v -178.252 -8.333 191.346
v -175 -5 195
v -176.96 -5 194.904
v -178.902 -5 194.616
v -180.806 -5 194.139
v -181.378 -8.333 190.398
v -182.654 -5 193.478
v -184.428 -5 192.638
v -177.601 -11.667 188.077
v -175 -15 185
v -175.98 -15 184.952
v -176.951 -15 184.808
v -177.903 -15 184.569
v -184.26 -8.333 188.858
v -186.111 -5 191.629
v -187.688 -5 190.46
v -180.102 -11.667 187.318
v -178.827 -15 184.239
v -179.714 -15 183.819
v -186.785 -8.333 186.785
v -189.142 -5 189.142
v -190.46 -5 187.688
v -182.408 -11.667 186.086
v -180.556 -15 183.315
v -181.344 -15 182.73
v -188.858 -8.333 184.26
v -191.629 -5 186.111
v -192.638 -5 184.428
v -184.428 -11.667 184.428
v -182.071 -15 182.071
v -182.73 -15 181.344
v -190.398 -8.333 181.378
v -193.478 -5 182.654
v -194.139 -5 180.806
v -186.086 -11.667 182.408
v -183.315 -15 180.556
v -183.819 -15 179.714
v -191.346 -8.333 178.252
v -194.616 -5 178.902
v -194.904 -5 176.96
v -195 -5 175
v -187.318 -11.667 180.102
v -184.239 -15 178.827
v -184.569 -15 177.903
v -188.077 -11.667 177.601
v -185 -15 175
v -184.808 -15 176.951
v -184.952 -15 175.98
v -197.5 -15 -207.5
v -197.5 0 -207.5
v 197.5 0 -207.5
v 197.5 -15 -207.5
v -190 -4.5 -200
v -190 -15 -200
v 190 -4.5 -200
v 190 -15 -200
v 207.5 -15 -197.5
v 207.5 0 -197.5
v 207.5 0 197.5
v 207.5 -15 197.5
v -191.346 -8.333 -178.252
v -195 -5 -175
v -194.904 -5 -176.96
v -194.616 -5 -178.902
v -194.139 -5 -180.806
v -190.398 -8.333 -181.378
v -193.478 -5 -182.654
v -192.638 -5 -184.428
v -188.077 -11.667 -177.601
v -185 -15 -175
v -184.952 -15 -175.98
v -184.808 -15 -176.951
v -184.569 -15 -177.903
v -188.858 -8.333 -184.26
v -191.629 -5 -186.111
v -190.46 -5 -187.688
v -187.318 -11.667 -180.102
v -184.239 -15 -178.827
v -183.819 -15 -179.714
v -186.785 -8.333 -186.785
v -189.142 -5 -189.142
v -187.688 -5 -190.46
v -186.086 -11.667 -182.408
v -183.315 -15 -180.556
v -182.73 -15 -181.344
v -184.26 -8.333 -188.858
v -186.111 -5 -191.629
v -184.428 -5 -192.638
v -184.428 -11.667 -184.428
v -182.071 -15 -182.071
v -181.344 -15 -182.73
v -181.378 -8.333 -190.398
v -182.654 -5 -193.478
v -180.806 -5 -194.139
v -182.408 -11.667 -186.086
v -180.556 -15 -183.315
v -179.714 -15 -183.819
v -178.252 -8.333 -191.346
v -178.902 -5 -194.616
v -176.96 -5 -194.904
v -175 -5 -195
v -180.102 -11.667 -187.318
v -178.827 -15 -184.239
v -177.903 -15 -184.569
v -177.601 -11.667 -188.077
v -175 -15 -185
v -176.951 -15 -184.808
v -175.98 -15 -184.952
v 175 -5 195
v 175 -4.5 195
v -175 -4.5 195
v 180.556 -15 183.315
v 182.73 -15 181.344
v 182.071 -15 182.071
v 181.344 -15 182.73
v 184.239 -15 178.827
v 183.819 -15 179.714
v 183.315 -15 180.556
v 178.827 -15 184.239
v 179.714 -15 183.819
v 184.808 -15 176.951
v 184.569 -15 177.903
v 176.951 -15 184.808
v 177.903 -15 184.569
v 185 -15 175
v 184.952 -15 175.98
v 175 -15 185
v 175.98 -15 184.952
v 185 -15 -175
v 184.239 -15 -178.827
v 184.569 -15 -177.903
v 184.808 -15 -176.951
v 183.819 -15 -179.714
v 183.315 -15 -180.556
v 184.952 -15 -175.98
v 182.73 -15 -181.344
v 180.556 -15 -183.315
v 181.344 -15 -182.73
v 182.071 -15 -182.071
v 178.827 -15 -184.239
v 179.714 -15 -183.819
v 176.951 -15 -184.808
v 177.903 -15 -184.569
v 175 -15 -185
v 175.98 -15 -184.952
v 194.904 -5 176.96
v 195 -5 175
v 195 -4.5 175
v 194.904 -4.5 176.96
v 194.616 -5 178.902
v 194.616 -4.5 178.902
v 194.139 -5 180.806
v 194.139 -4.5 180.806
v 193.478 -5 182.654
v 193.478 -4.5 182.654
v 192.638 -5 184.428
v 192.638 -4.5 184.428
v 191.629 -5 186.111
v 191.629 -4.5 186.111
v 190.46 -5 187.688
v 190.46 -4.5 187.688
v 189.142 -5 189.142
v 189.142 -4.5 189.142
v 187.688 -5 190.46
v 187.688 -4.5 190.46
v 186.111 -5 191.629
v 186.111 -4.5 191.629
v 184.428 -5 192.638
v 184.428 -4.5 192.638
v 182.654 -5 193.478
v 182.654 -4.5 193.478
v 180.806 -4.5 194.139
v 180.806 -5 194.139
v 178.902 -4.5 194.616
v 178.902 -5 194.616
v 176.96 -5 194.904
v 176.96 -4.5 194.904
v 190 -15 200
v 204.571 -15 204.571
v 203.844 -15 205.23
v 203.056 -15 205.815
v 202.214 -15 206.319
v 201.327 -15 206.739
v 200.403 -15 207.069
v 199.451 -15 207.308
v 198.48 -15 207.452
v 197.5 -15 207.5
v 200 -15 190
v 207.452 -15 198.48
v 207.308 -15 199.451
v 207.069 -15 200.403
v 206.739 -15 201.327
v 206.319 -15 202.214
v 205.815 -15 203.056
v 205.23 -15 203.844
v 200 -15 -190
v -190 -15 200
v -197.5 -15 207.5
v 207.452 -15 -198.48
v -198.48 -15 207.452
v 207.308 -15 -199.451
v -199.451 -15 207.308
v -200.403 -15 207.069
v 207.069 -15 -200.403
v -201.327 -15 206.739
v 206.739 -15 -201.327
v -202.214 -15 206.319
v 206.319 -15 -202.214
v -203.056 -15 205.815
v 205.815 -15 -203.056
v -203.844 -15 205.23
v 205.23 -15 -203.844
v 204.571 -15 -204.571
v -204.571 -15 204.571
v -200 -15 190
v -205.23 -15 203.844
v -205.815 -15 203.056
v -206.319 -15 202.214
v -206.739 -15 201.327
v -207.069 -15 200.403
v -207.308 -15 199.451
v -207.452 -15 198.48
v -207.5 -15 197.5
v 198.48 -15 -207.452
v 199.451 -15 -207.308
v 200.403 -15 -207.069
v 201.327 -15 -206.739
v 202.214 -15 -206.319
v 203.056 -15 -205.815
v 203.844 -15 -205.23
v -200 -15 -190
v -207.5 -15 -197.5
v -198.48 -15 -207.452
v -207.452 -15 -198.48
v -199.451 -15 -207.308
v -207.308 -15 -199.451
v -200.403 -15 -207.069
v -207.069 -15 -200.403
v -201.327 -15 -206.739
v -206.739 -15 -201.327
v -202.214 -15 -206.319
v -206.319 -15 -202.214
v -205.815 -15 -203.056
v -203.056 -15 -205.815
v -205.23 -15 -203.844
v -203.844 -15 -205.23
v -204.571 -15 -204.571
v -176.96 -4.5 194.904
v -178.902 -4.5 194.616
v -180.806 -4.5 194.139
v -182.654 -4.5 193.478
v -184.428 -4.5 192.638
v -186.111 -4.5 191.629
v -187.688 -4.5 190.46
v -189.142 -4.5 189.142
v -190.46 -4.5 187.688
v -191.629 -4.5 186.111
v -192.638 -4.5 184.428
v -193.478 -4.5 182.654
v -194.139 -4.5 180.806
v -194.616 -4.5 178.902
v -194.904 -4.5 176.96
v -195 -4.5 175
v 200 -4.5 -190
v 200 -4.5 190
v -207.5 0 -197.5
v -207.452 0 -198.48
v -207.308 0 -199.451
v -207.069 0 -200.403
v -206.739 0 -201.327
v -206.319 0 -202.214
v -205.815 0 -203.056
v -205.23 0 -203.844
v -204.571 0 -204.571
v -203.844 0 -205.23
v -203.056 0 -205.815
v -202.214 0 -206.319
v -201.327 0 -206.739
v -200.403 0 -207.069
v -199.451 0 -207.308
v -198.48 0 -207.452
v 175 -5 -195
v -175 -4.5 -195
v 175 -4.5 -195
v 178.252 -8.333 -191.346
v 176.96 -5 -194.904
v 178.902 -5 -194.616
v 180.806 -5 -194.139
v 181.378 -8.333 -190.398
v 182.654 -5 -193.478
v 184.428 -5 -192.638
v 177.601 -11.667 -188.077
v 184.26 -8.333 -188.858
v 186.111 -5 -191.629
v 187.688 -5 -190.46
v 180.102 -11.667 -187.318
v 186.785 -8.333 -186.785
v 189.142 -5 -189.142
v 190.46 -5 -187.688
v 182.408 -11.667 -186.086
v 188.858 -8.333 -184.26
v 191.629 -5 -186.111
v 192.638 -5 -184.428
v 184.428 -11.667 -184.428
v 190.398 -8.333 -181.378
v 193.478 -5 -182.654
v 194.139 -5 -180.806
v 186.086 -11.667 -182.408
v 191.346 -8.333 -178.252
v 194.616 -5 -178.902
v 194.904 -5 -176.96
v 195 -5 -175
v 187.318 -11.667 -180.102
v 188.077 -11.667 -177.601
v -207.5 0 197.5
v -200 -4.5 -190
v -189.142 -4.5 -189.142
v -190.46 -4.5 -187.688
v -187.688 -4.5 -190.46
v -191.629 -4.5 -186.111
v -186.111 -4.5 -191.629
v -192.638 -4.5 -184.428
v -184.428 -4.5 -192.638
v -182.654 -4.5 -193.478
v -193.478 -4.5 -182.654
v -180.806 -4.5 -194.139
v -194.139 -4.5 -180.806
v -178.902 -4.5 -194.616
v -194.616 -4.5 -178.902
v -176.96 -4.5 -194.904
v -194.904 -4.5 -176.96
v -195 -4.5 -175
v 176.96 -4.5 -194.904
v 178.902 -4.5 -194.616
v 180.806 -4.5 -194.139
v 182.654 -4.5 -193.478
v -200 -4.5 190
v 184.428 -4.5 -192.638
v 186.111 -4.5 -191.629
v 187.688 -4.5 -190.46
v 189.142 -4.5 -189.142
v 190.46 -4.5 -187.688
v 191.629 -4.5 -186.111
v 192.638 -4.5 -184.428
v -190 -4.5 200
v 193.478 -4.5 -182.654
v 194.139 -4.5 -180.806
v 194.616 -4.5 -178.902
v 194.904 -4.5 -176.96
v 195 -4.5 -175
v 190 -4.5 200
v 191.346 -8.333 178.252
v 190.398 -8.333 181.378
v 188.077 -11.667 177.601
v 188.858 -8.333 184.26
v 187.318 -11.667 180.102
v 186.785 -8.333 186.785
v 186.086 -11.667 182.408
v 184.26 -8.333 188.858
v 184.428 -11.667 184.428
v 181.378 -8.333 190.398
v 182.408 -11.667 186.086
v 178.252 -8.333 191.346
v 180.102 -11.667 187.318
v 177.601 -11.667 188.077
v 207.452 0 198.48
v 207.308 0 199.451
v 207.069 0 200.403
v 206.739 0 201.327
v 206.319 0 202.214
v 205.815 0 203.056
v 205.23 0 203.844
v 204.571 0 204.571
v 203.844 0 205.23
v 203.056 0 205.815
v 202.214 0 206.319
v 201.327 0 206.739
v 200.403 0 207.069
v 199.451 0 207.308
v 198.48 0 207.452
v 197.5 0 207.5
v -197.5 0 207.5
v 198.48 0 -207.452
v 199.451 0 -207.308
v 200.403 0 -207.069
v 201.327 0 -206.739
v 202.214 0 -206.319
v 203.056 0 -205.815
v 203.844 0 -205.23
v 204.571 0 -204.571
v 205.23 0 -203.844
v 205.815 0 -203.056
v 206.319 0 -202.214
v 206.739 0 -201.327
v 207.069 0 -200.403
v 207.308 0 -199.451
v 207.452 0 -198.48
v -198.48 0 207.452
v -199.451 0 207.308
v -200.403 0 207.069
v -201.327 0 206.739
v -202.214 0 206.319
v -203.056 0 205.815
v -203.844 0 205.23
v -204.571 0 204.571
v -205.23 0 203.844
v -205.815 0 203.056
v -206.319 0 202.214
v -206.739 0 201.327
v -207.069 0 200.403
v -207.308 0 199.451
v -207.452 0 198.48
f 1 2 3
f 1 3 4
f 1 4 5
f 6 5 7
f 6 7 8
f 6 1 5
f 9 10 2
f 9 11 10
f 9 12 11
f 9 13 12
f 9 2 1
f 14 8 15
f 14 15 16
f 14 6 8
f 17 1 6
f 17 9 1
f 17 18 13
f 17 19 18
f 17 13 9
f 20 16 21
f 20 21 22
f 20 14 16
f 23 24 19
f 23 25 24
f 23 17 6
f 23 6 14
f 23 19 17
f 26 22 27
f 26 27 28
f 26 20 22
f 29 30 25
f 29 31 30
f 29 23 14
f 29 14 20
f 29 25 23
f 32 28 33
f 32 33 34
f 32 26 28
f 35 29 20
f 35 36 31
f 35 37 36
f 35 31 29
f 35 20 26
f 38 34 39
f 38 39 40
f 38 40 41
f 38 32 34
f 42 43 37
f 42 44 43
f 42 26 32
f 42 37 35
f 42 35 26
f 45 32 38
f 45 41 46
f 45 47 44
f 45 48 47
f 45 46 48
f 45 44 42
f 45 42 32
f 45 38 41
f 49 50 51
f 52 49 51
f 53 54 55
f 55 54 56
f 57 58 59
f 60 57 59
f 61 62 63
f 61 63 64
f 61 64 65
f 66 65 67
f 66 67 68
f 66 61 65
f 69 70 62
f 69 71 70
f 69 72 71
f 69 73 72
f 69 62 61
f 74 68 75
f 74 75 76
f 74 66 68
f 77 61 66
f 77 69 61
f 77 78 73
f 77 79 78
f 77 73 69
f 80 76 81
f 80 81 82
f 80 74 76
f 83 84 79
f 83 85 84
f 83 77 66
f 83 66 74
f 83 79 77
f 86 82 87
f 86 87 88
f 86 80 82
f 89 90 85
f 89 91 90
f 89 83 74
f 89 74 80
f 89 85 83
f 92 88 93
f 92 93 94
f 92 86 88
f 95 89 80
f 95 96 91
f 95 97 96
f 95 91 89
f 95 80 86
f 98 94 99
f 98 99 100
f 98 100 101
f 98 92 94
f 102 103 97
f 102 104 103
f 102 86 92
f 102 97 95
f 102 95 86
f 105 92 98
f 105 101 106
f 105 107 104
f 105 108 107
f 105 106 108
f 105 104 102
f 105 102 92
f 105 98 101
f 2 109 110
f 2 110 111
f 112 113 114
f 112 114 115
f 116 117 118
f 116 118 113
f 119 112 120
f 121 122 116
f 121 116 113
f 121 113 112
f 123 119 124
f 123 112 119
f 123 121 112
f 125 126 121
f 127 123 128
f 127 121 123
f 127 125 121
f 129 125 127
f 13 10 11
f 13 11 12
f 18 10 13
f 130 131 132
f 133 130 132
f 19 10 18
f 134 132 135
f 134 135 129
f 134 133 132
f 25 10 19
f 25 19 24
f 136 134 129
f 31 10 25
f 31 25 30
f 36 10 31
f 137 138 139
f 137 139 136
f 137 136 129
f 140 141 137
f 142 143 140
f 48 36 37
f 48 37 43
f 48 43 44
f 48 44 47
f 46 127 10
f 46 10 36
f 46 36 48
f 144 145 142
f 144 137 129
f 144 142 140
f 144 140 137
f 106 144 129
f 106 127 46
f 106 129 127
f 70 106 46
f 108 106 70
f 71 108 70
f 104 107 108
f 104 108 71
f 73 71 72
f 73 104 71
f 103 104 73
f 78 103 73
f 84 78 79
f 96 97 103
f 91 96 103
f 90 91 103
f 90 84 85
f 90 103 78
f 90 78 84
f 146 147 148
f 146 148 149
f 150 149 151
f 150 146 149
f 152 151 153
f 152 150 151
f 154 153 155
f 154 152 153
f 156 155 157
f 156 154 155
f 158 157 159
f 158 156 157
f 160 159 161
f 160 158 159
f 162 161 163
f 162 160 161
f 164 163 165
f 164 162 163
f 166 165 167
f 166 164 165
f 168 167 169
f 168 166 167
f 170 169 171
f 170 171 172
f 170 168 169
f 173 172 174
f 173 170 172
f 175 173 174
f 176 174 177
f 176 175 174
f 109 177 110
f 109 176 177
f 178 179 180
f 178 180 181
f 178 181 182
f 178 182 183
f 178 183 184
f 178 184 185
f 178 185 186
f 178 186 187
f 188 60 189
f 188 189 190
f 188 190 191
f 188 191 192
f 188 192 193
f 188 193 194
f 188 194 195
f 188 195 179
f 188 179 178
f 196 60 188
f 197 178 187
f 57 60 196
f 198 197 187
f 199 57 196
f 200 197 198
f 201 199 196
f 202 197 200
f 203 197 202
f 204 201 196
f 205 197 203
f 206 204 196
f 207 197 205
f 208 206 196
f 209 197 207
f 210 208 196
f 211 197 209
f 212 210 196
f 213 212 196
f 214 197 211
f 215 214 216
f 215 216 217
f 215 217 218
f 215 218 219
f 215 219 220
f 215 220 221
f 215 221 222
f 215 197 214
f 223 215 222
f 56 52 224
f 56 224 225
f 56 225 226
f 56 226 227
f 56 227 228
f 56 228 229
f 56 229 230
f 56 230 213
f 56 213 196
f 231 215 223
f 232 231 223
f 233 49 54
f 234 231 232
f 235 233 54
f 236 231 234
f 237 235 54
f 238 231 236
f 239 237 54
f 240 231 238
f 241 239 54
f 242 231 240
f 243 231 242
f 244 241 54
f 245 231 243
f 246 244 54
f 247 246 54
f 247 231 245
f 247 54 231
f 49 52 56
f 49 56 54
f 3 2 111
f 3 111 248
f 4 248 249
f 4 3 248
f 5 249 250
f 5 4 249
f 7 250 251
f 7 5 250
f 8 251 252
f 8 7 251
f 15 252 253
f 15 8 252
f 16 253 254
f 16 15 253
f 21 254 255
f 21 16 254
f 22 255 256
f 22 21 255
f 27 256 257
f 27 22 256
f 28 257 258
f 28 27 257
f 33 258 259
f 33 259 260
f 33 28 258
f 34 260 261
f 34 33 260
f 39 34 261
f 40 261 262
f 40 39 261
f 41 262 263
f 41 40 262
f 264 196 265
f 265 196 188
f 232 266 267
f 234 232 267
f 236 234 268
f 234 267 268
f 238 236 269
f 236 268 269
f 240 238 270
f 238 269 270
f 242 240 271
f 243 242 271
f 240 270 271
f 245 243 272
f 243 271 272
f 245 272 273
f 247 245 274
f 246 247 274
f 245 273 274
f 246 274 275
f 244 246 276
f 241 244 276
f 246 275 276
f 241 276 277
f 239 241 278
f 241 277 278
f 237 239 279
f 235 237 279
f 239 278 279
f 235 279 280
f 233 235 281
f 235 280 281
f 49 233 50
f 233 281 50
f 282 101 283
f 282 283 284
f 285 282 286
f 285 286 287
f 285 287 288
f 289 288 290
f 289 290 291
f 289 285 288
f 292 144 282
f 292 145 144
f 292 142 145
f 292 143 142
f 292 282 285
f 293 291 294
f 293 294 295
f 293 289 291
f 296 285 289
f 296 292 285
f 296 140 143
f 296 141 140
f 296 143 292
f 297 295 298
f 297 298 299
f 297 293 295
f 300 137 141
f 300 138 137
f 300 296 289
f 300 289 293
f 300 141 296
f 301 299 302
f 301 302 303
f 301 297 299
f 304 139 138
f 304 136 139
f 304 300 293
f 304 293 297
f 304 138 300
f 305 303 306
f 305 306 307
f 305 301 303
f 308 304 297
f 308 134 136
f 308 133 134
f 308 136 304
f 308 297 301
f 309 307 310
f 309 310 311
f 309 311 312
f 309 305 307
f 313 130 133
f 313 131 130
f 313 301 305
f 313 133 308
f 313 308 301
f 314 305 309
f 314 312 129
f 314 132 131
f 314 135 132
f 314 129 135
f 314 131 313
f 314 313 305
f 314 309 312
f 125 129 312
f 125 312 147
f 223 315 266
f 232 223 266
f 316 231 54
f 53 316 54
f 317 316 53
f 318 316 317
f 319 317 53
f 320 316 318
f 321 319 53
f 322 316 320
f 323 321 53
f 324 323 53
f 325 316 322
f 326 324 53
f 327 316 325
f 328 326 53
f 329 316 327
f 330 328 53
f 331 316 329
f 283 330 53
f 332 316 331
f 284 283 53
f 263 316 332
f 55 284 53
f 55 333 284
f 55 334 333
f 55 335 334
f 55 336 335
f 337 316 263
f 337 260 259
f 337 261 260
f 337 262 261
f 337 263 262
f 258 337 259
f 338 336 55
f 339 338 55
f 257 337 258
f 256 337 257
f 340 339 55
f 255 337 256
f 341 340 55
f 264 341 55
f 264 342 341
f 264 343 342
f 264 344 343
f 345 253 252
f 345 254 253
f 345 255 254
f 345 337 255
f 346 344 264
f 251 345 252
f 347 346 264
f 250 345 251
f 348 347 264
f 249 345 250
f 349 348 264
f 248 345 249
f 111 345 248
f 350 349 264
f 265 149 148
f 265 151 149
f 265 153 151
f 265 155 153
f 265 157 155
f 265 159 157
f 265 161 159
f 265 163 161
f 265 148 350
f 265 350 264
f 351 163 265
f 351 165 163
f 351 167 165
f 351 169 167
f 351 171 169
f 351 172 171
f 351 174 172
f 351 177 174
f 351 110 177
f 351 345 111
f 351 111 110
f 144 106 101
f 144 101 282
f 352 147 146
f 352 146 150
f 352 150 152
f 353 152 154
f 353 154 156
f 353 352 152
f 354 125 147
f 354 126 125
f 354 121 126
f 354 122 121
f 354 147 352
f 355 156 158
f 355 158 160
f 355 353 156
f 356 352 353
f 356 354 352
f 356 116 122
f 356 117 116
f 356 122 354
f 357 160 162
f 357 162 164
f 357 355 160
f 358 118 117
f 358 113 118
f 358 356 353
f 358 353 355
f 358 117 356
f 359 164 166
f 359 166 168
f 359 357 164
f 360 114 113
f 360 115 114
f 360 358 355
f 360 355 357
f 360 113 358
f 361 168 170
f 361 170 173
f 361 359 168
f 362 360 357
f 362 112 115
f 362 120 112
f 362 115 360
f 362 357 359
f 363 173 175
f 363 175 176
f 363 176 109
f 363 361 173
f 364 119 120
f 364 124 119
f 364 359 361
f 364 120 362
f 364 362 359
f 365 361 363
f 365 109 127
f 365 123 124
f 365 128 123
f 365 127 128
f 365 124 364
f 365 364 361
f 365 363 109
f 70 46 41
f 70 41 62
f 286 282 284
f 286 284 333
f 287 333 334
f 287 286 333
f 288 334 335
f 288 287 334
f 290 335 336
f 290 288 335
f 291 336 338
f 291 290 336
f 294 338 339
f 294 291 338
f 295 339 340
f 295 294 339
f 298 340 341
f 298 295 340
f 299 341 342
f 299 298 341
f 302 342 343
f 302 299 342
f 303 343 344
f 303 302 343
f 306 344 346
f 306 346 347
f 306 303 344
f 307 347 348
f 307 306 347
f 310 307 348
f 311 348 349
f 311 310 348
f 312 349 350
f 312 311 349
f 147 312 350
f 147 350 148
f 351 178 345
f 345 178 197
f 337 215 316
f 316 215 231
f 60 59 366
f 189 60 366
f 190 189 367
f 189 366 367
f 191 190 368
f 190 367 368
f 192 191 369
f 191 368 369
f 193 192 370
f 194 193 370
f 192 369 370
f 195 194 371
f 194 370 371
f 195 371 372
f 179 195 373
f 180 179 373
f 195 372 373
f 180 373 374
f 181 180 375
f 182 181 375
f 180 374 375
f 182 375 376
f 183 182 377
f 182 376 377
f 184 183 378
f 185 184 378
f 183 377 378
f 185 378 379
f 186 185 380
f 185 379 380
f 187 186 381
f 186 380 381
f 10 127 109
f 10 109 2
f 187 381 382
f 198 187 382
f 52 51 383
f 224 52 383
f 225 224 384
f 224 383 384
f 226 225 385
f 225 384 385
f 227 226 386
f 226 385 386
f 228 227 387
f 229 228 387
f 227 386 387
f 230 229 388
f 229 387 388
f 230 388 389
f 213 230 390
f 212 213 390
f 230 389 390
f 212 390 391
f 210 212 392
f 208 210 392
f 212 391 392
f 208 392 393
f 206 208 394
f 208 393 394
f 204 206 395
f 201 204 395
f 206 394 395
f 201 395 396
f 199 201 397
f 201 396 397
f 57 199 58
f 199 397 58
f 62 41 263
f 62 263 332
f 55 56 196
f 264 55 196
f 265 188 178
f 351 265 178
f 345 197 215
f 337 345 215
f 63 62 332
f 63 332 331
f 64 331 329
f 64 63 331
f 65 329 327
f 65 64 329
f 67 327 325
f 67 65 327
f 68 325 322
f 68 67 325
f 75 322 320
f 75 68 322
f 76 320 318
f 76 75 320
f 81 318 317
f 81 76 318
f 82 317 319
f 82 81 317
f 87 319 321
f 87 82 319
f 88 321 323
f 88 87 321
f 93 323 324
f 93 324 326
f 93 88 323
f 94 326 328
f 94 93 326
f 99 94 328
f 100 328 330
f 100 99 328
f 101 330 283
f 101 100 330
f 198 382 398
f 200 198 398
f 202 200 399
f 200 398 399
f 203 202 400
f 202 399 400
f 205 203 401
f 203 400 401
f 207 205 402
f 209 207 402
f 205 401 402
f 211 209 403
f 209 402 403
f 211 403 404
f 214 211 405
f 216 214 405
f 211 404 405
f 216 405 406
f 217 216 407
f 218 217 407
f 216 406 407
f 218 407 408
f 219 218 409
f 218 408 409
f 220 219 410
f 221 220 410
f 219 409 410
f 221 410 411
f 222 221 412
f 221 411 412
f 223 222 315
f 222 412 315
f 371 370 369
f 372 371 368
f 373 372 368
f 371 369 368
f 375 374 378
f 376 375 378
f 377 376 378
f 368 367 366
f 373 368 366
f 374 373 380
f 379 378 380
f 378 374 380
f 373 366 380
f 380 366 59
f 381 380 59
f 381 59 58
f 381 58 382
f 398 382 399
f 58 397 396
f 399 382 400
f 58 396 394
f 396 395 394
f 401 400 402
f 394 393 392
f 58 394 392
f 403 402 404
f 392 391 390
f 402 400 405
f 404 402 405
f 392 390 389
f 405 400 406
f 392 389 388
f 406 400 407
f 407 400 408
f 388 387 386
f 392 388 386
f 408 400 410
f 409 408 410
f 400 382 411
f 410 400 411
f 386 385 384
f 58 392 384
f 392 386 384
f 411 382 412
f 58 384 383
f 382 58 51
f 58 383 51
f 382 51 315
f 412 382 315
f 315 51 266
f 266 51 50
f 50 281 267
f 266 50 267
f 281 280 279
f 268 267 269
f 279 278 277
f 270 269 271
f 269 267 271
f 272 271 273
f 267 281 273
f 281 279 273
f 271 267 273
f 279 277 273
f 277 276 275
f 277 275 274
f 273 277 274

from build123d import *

# Parameters (mm, degrees)
BOSS_EXTRUDE1_DEPTH = 15
CUT_EXTRUDE1_DEPTH  = 10.5
CHAMFER1_SIZE       = 10


with BuildPart() as part:
    # Sketch1 → Boss-Extrude1 (new body)
    with BuildSketch(Plane(origin=(0, 0, 0), x_dir=(1, 0, 0), z_dir=(0, 1, 0))):
        with BuildLine():
            Line((-197.5, 207.5), (197.5, 207.5))
            ThreePointArc((197.5, 207.5), (204.571067812, 204.571067812), (207.5, 197.5))
            Line((207.5, 197.5), (207.5, -197.5))
            ThreePointArc((207.5, -197.5), (204.571067812, -204.571067812), (197.5, -207.5))
            Line((197.5, -207.5), (-197.5, -207.5))
            ThreePointArc((-197.5, -207.5), (-204.571067812, -204.571067812), (-207.5, -197.5))
            Line((-207.5, -197.5), (-207.5, 197.5))
            ThreePointArc((-207.5, 197.5), (-204.571067812, 204.571067812), (-197.5, 207.5))
        make_face()
    extrude(amount=-BOSS_EXTRUDE1_DEPTH)

    # Sketch2 → Cut-Extrude1 (cut)
    with BuildSketch(Plane.XZ.offset(15)):
        Polygon((-190, -200), (190, -200), (200, -190), (200, 190), (190, 200), (-190, 200), (-200, 190), (-200, -190), align=None)
        with BuildLine():
            Line((-175, -195), (175, -195))
            ThreePointArc((175, -195), (189.142135624, -189.142135624), (195, -175))
            Line((195, -175), (195, 175))
            ThreePointArc((195, 175), (189.142135624, 189.142135624), (175, 195))
            Line((175, 195), (-175, 195))
            ThreePointArc((-175, 195), (-189.142135624, 189.142135624), (-195, 175))
            Line((-195, 175), (-195, -175))
            ThreePointArc((-195, -175), (-189.142135624, -189.142135624), (-175, -195))
        make_face(mode=Mode.SUBTRACT)
    extrude(amount=-CUT_EXTRUDE1_DEPTH, mode=Mode.SUBTRACT)

    # Chamfer1
    chamfer1_edges = [part.edges().sort_by_distance(p)[0] for p in [
        (189.142135624, -15, -189.142135624),
        (0, -15, -195),
        (-189.142135624, -15, -189.142135624),
        (-195, -15, 0),
        (-189.142135624, -15, 189.142135624),
        (0, -15, 195),
        (189.142135624, -15, 189.142135624),
        (195, -15, 0),
    ]]
    chamfer(chamfer1_edges, length=CHAMFER1_SIZE)


solid = part.part
